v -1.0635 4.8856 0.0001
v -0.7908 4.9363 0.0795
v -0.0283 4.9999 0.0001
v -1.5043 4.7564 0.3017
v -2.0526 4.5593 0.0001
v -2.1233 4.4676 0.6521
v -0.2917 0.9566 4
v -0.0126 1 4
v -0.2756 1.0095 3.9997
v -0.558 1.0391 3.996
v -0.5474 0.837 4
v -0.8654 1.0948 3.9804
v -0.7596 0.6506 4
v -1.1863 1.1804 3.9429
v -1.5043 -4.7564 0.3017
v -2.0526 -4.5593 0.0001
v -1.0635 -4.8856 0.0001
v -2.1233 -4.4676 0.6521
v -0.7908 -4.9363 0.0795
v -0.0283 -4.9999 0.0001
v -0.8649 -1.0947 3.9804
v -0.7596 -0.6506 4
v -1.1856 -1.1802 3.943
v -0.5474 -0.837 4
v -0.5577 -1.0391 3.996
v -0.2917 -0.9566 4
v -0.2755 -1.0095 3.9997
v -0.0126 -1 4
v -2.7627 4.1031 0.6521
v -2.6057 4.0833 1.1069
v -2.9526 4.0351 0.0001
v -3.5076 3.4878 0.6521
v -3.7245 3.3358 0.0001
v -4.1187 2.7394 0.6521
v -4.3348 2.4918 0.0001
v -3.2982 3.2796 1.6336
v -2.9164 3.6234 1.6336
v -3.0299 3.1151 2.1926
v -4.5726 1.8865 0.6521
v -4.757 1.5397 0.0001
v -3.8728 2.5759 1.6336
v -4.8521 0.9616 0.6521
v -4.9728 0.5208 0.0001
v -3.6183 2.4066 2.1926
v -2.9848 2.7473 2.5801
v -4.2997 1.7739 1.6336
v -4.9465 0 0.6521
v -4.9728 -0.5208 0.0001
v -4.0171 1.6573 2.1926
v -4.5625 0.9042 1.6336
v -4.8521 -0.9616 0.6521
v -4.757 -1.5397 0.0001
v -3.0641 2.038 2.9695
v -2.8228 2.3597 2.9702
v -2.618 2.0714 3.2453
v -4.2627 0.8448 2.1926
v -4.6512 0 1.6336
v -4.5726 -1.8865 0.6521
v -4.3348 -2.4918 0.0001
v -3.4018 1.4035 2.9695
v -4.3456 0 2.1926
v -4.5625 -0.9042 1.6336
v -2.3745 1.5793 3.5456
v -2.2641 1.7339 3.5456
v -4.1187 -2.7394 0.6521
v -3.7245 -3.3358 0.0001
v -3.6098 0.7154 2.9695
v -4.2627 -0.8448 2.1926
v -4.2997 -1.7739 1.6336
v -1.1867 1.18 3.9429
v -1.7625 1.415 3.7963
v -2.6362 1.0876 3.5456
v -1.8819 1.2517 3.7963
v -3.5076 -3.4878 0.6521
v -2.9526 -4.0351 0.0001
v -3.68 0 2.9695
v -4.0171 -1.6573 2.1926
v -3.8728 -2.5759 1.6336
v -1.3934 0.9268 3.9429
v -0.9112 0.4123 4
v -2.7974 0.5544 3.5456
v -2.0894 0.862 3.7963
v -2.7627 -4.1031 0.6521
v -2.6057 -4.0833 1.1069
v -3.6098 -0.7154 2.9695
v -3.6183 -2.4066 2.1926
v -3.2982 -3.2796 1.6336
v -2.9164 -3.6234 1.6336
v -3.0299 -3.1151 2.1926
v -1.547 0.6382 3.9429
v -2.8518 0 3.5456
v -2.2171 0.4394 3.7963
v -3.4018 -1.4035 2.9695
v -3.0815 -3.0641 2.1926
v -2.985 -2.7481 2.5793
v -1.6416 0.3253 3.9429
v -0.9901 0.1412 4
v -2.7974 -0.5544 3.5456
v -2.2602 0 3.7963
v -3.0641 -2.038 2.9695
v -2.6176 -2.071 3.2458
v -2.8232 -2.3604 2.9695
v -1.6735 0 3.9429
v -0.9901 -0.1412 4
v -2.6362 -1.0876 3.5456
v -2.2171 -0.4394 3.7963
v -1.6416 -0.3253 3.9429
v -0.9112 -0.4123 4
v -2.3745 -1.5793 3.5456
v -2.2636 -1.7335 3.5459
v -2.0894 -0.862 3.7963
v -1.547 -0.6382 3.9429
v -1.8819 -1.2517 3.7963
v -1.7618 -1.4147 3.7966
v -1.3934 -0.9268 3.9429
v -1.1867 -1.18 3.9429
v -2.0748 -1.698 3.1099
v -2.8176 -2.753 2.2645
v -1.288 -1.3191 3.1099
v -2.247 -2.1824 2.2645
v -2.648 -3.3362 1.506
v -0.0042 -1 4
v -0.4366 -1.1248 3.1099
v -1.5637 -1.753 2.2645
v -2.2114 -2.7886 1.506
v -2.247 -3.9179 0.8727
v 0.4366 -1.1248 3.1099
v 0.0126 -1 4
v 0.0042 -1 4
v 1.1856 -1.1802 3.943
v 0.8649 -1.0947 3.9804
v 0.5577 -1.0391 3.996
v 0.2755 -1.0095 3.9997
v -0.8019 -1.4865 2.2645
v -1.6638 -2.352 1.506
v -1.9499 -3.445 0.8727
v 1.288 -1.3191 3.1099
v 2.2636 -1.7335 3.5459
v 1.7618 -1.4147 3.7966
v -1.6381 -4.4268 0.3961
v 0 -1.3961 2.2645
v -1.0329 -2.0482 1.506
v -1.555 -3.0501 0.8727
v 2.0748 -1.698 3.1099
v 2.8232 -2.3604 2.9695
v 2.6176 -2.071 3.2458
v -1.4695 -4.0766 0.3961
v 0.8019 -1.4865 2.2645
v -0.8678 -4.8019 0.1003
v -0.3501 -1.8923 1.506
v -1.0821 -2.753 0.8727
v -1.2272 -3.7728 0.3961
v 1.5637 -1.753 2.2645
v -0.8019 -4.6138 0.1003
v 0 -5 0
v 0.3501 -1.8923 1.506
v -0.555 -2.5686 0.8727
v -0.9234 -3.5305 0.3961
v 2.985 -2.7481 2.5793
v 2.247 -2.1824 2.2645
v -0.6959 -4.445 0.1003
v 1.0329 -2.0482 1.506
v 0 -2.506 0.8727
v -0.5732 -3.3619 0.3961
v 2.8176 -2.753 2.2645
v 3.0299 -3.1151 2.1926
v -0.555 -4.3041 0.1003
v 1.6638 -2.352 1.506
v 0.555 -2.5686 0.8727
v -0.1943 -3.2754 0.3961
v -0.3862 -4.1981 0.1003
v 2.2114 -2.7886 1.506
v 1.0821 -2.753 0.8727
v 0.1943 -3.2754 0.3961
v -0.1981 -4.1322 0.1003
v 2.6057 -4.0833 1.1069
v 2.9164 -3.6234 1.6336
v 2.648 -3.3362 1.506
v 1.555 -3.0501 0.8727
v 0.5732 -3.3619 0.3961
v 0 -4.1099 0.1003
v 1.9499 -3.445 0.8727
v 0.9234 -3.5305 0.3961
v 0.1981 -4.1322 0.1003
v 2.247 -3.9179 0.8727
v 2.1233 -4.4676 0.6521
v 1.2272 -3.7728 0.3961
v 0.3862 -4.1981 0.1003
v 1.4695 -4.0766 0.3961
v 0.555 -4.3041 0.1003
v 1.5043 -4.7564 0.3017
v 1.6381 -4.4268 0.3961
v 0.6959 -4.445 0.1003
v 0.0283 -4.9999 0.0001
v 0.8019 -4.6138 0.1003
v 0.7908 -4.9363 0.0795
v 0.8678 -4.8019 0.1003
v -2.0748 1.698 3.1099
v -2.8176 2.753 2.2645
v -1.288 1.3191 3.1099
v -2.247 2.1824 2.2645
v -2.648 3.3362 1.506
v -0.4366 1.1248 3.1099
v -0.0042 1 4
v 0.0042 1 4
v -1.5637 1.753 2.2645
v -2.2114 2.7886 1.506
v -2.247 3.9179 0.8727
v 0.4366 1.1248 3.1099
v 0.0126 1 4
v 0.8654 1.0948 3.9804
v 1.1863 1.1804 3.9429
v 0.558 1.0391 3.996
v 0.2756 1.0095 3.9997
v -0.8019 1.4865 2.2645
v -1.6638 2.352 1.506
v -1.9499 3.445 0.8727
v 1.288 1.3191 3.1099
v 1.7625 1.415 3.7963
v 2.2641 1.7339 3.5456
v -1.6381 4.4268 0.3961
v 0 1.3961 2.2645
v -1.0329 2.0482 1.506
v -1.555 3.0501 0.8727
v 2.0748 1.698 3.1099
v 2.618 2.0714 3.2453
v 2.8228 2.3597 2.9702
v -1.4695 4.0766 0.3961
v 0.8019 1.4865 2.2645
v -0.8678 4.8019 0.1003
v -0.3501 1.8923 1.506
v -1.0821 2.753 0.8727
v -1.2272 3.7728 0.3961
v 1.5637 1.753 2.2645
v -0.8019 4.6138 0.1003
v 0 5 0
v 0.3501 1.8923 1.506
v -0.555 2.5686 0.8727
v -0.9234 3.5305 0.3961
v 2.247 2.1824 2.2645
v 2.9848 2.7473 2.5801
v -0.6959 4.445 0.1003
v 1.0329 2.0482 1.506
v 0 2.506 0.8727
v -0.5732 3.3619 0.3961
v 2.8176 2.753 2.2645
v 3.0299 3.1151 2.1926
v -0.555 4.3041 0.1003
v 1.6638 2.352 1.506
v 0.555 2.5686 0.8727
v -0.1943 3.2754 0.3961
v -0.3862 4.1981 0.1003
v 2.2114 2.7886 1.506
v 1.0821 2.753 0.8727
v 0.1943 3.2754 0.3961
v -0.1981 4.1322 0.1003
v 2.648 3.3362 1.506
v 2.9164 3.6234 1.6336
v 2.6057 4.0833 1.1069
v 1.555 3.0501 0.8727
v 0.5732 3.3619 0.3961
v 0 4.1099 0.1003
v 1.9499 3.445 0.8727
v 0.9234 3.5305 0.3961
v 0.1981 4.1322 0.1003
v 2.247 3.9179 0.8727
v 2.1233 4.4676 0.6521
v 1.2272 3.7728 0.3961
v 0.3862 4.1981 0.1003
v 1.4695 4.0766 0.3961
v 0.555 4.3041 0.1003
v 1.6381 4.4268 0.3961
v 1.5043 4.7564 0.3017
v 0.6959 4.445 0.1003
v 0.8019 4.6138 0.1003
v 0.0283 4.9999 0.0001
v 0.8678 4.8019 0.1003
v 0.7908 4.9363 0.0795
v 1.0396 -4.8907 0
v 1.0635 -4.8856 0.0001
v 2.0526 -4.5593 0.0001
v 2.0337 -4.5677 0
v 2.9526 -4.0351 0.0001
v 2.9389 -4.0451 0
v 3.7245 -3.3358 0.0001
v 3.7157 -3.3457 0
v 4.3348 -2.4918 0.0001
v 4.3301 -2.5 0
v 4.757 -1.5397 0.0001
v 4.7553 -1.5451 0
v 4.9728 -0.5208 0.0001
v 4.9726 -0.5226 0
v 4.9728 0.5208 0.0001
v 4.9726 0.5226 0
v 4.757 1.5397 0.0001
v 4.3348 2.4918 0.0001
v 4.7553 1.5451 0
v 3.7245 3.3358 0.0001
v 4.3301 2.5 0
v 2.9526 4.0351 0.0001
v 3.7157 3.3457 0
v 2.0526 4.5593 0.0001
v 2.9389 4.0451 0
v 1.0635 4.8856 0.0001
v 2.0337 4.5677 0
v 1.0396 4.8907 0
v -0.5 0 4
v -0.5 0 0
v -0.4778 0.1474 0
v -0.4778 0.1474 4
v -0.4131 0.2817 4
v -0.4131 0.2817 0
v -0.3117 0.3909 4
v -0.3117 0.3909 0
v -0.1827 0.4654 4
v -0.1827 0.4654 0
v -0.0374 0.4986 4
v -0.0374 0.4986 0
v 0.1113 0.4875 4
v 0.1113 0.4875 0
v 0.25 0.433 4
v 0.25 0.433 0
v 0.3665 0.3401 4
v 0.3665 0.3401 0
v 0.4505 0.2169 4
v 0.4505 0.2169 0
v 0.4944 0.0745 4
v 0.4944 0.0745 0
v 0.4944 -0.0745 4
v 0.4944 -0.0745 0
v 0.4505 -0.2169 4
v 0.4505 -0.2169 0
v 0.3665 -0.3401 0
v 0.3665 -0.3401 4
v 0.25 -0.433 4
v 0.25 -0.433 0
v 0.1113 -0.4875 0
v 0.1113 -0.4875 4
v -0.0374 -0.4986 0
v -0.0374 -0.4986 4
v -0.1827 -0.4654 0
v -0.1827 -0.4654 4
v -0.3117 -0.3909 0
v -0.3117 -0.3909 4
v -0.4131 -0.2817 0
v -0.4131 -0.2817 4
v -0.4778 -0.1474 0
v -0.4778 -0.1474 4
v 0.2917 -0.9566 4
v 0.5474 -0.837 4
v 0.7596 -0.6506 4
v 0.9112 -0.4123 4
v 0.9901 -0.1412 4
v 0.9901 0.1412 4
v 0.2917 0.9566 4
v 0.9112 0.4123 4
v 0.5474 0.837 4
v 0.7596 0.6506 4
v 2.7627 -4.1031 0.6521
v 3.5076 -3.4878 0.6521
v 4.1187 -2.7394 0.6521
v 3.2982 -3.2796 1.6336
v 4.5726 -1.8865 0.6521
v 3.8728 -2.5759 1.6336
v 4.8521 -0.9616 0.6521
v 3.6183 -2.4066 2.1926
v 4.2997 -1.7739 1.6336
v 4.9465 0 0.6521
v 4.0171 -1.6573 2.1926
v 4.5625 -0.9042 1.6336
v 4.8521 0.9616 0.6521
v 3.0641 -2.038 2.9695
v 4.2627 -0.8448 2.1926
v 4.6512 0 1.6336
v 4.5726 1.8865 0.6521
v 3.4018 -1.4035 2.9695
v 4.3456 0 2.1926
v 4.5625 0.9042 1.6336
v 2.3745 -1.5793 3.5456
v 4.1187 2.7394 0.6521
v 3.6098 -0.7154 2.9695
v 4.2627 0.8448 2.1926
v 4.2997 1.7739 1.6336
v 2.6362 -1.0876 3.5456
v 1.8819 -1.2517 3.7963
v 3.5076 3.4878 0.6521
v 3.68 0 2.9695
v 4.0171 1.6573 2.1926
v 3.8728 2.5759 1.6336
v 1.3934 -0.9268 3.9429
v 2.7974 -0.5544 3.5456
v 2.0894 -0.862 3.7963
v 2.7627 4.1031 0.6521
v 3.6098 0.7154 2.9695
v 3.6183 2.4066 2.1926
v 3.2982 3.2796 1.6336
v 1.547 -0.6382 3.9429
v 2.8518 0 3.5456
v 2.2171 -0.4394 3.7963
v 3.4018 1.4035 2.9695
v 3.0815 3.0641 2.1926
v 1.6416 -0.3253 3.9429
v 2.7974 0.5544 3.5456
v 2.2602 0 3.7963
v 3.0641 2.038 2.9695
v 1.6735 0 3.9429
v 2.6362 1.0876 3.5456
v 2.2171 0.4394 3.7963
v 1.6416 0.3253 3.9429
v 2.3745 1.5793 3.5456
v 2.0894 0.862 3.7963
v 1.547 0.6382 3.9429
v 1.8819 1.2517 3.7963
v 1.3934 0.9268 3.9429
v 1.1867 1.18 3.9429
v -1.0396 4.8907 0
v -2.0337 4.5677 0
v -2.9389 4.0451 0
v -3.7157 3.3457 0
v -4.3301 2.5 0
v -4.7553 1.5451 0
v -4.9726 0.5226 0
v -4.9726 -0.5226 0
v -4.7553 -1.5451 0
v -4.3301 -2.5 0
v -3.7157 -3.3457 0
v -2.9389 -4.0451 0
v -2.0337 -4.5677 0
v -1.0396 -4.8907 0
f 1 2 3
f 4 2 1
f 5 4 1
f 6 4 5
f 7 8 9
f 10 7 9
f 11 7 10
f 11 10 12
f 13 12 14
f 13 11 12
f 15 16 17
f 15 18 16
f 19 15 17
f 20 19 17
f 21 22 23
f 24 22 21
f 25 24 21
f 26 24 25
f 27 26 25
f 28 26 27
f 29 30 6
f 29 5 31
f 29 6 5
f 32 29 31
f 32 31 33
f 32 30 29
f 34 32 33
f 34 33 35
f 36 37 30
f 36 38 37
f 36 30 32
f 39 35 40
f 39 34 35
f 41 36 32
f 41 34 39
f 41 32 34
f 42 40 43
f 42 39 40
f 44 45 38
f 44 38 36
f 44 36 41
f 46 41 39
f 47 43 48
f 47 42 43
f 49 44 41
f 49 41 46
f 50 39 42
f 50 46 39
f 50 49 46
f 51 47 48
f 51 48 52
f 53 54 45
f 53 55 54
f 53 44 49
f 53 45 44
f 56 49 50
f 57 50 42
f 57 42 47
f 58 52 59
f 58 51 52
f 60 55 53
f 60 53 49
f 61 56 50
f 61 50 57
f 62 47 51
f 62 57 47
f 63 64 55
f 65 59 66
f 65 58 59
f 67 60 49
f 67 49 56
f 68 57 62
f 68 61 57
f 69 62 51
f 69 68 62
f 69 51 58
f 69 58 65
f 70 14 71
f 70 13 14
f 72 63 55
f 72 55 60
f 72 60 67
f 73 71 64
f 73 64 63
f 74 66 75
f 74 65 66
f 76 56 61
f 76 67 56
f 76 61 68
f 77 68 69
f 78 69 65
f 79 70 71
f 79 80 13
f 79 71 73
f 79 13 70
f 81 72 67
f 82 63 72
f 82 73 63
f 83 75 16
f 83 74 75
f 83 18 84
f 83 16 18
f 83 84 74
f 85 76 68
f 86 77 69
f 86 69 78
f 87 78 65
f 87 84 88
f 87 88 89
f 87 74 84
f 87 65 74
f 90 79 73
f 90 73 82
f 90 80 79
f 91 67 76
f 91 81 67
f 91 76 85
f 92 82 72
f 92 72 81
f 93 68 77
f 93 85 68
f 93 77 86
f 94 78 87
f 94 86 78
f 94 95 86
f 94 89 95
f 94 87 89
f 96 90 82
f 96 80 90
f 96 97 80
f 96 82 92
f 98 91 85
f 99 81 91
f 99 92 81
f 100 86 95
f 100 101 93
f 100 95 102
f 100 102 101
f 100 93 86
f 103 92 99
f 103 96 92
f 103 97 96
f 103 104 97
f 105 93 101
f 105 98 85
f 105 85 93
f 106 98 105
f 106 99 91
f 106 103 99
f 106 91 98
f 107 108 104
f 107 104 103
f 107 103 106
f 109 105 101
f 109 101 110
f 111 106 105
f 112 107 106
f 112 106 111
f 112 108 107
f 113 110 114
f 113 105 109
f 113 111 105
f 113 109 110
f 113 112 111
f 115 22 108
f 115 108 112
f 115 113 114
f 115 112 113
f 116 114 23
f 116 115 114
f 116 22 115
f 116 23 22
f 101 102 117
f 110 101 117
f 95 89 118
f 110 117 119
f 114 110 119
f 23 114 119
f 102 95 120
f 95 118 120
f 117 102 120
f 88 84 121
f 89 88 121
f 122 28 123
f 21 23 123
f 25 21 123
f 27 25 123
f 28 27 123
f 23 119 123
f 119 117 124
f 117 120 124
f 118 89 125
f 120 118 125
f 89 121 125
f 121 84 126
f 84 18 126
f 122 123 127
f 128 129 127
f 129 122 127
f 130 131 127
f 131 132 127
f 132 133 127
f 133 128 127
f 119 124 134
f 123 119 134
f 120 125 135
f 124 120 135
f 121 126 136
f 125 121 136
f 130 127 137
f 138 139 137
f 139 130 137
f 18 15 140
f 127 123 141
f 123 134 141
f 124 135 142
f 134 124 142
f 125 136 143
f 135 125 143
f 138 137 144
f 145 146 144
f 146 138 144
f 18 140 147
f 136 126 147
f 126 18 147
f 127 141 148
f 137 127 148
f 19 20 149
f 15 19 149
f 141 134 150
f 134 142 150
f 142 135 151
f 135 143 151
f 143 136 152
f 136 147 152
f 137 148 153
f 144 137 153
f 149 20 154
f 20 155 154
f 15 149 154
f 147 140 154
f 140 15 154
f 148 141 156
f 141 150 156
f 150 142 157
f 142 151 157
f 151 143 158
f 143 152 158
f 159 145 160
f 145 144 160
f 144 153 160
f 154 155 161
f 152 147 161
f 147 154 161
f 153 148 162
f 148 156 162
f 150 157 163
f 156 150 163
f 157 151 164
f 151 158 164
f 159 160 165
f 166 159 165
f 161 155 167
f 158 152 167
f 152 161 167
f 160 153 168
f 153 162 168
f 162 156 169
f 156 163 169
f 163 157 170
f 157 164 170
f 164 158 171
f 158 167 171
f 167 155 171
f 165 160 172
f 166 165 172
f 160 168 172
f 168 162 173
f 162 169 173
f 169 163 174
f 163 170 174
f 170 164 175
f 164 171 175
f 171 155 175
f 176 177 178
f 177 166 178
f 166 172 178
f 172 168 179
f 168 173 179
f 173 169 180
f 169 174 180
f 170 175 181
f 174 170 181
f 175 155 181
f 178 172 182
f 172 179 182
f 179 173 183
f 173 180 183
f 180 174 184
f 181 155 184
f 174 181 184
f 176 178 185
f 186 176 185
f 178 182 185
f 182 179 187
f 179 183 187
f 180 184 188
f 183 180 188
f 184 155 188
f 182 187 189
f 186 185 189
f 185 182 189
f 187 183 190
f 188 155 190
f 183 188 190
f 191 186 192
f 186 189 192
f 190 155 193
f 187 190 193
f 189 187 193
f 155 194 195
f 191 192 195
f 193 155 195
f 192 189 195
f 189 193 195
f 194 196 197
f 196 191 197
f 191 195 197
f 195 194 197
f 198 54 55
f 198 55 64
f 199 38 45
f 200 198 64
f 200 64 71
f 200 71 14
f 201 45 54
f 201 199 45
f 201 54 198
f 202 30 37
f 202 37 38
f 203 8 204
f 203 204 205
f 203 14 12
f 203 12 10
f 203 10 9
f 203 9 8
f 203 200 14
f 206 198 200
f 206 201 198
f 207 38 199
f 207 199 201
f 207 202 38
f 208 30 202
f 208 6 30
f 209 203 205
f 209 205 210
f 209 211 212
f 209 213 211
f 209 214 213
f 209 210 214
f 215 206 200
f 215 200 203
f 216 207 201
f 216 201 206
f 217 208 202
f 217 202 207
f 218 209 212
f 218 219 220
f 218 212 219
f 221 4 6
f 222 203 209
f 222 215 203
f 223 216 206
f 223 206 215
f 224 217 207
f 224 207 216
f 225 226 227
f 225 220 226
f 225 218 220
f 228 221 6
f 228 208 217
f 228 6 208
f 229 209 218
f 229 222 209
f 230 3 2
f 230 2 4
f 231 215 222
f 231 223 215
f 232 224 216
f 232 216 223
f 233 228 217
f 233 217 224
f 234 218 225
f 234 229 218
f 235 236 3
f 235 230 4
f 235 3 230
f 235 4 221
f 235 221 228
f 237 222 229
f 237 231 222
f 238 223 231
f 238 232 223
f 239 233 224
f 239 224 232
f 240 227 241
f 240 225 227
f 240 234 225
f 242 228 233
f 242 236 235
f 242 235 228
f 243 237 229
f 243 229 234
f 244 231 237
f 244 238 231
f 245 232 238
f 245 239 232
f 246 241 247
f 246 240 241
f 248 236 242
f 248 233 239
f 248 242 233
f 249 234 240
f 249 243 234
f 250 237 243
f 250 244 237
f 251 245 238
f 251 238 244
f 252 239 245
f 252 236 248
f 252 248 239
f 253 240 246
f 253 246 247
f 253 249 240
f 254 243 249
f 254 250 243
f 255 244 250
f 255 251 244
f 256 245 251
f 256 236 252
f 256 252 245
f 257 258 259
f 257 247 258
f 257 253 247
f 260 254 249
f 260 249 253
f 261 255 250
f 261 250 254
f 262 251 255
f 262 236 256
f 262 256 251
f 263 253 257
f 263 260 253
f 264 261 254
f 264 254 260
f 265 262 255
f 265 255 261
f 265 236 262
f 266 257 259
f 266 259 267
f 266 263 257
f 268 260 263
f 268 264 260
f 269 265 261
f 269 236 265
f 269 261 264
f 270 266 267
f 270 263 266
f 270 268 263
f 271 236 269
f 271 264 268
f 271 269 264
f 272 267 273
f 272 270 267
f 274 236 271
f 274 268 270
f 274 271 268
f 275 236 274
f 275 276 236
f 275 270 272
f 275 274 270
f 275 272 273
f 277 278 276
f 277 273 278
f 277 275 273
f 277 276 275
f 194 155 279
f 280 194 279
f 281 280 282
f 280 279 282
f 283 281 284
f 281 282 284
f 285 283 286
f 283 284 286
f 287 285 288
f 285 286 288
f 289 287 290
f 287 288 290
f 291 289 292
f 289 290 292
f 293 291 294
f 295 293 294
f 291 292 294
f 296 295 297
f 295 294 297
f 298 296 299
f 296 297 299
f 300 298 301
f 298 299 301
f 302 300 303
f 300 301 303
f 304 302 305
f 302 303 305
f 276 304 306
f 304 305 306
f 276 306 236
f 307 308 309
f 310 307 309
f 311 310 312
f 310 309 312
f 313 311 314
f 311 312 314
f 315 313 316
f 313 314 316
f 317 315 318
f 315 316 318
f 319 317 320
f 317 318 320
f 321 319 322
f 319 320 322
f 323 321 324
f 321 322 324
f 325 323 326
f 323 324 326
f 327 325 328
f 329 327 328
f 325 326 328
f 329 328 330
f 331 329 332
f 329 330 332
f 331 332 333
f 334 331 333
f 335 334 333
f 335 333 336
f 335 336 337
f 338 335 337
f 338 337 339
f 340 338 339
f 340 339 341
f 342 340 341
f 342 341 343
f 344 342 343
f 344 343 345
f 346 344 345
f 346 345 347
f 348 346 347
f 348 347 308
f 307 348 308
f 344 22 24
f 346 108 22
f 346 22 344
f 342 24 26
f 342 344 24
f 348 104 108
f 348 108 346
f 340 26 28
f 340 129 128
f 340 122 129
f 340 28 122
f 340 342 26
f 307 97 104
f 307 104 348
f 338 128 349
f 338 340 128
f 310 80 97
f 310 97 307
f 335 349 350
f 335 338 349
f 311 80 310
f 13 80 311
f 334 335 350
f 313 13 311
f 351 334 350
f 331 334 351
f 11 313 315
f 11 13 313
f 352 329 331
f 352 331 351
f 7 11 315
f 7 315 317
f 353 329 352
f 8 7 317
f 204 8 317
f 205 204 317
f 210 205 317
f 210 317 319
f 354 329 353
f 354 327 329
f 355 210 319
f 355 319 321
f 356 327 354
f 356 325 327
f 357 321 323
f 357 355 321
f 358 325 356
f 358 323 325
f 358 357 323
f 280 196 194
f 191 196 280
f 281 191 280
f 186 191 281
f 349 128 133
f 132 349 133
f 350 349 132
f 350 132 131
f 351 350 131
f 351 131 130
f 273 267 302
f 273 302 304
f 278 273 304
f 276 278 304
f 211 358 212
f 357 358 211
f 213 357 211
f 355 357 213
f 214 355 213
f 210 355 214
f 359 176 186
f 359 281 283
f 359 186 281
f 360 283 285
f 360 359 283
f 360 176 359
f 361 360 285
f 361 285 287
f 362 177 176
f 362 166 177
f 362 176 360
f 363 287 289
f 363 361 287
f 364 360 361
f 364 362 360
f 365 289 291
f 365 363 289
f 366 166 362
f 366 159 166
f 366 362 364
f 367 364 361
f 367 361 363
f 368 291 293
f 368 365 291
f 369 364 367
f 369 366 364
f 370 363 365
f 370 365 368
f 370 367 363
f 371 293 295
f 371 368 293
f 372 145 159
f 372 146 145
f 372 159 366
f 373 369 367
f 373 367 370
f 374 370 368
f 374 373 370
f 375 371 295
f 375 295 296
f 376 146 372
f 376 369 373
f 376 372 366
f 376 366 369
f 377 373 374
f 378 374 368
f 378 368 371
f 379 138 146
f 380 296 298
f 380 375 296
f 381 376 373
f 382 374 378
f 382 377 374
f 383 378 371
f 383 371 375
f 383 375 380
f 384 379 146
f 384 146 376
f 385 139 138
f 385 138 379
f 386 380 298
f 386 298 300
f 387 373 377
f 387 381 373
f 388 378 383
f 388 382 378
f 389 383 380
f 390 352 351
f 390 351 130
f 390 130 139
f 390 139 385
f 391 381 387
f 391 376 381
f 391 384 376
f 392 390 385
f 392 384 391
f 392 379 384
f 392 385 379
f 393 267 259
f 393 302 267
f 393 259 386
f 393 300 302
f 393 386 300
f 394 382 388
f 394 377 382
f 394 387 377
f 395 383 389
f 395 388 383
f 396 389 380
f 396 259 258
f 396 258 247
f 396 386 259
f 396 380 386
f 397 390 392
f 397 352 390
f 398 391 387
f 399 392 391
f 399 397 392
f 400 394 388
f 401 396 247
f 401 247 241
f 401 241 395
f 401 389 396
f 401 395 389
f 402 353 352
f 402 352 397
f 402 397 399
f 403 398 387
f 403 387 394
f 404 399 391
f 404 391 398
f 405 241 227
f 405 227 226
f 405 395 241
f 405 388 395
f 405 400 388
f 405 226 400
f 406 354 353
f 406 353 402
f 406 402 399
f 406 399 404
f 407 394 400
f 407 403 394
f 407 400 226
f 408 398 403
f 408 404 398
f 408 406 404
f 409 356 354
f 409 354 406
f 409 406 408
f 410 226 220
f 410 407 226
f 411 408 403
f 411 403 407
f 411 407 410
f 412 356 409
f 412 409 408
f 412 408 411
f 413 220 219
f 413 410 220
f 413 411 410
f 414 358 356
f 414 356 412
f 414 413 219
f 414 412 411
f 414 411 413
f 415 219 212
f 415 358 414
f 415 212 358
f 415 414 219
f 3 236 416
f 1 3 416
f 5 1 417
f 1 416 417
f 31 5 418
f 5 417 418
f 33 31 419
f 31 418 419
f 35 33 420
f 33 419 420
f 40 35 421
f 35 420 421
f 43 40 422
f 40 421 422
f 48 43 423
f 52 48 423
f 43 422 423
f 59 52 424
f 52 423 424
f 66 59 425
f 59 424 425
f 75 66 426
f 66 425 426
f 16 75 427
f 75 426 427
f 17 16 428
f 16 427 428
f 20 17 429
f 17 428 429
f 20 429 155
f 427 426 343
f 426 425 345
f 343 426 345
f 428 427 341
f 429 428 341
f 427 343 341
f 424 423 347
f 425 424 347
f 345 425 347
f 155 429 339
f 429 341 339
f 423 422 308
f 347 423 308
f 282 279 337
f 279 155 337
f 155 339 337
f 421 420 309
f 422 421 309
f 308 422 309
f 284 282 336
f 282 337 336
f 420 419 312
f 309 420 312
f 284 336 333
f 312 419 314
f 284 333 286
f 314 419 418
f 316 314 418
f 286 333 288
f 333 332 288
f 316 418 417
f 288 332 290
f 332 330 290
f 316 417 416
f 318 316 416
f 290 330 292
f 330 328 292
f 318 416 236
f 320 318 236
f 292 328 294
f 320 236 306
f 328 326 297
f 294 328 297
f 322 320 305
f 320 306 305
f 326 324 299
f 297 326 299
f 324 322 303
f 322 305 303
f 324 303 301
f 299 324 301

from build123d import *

# Parameters (mm, degrees)
SKETCH1_R           = 5
BOSS_EXTRUDE1_DEPTH = 4
FILLET1_R           = 4
SKETCH3_R           = 0.5
CUT_EXTRUDE1_DEPTH  = 9.124038577


with BuildPart() as part:
    # Sketch1 → Boss-Extrude1 (new body)
    with BuildSketch(Plane.XY):
        Circle(SKETCH1_R)
    extrude(amount=BOSS_EXTRUDE1_DEPTH)

    # Fillet1
    fillet1_edges = [part.edges().sort_by_distance(p)[0] for p in [
        (-5, 0, 4),
    ]]
    fillet(fillet1_edges, radius=FILLET1_R - 0.0001)  # a hair under: the kernel refuses the full size

    # Sketch2 → Cut-Revolve2 (revolve, cut)
    with BuildSketch(Plane(origin=(0, 0, 0), x_dir=(0, 0, -1), z_dir=(1, 0, 0))):
        with BuildLine():
            Line((0, 5), (-8, 5))
            ThreePointArc((-8, 5), (-4, 1), (0, 5))
        make_face()
    cut_revolve2 = revolve(axis=Axis((0, 5, 0), (0, 0, 1)), mode=Mode.SUBTRACT)

    # Mirror1: Cut-Revolve2 across plane
    add(cut_revolve2.mirror(Plane.ZX), mode=Mode.SUBTRACT)

    # Sketch3 → Cut-Extrude1 (cut, through all)
    with BuildSketch(Plane(origin=(0, 0, 0), x_dir=(-1, 0, 0), z_dir=(0, 0, -1))):
        Circle(SKETCH3_R)
    extrude(amount=-CUT_EXTRUDE1_DEPTH, mode=Mode.SUBTRACT)


solid = part.part
